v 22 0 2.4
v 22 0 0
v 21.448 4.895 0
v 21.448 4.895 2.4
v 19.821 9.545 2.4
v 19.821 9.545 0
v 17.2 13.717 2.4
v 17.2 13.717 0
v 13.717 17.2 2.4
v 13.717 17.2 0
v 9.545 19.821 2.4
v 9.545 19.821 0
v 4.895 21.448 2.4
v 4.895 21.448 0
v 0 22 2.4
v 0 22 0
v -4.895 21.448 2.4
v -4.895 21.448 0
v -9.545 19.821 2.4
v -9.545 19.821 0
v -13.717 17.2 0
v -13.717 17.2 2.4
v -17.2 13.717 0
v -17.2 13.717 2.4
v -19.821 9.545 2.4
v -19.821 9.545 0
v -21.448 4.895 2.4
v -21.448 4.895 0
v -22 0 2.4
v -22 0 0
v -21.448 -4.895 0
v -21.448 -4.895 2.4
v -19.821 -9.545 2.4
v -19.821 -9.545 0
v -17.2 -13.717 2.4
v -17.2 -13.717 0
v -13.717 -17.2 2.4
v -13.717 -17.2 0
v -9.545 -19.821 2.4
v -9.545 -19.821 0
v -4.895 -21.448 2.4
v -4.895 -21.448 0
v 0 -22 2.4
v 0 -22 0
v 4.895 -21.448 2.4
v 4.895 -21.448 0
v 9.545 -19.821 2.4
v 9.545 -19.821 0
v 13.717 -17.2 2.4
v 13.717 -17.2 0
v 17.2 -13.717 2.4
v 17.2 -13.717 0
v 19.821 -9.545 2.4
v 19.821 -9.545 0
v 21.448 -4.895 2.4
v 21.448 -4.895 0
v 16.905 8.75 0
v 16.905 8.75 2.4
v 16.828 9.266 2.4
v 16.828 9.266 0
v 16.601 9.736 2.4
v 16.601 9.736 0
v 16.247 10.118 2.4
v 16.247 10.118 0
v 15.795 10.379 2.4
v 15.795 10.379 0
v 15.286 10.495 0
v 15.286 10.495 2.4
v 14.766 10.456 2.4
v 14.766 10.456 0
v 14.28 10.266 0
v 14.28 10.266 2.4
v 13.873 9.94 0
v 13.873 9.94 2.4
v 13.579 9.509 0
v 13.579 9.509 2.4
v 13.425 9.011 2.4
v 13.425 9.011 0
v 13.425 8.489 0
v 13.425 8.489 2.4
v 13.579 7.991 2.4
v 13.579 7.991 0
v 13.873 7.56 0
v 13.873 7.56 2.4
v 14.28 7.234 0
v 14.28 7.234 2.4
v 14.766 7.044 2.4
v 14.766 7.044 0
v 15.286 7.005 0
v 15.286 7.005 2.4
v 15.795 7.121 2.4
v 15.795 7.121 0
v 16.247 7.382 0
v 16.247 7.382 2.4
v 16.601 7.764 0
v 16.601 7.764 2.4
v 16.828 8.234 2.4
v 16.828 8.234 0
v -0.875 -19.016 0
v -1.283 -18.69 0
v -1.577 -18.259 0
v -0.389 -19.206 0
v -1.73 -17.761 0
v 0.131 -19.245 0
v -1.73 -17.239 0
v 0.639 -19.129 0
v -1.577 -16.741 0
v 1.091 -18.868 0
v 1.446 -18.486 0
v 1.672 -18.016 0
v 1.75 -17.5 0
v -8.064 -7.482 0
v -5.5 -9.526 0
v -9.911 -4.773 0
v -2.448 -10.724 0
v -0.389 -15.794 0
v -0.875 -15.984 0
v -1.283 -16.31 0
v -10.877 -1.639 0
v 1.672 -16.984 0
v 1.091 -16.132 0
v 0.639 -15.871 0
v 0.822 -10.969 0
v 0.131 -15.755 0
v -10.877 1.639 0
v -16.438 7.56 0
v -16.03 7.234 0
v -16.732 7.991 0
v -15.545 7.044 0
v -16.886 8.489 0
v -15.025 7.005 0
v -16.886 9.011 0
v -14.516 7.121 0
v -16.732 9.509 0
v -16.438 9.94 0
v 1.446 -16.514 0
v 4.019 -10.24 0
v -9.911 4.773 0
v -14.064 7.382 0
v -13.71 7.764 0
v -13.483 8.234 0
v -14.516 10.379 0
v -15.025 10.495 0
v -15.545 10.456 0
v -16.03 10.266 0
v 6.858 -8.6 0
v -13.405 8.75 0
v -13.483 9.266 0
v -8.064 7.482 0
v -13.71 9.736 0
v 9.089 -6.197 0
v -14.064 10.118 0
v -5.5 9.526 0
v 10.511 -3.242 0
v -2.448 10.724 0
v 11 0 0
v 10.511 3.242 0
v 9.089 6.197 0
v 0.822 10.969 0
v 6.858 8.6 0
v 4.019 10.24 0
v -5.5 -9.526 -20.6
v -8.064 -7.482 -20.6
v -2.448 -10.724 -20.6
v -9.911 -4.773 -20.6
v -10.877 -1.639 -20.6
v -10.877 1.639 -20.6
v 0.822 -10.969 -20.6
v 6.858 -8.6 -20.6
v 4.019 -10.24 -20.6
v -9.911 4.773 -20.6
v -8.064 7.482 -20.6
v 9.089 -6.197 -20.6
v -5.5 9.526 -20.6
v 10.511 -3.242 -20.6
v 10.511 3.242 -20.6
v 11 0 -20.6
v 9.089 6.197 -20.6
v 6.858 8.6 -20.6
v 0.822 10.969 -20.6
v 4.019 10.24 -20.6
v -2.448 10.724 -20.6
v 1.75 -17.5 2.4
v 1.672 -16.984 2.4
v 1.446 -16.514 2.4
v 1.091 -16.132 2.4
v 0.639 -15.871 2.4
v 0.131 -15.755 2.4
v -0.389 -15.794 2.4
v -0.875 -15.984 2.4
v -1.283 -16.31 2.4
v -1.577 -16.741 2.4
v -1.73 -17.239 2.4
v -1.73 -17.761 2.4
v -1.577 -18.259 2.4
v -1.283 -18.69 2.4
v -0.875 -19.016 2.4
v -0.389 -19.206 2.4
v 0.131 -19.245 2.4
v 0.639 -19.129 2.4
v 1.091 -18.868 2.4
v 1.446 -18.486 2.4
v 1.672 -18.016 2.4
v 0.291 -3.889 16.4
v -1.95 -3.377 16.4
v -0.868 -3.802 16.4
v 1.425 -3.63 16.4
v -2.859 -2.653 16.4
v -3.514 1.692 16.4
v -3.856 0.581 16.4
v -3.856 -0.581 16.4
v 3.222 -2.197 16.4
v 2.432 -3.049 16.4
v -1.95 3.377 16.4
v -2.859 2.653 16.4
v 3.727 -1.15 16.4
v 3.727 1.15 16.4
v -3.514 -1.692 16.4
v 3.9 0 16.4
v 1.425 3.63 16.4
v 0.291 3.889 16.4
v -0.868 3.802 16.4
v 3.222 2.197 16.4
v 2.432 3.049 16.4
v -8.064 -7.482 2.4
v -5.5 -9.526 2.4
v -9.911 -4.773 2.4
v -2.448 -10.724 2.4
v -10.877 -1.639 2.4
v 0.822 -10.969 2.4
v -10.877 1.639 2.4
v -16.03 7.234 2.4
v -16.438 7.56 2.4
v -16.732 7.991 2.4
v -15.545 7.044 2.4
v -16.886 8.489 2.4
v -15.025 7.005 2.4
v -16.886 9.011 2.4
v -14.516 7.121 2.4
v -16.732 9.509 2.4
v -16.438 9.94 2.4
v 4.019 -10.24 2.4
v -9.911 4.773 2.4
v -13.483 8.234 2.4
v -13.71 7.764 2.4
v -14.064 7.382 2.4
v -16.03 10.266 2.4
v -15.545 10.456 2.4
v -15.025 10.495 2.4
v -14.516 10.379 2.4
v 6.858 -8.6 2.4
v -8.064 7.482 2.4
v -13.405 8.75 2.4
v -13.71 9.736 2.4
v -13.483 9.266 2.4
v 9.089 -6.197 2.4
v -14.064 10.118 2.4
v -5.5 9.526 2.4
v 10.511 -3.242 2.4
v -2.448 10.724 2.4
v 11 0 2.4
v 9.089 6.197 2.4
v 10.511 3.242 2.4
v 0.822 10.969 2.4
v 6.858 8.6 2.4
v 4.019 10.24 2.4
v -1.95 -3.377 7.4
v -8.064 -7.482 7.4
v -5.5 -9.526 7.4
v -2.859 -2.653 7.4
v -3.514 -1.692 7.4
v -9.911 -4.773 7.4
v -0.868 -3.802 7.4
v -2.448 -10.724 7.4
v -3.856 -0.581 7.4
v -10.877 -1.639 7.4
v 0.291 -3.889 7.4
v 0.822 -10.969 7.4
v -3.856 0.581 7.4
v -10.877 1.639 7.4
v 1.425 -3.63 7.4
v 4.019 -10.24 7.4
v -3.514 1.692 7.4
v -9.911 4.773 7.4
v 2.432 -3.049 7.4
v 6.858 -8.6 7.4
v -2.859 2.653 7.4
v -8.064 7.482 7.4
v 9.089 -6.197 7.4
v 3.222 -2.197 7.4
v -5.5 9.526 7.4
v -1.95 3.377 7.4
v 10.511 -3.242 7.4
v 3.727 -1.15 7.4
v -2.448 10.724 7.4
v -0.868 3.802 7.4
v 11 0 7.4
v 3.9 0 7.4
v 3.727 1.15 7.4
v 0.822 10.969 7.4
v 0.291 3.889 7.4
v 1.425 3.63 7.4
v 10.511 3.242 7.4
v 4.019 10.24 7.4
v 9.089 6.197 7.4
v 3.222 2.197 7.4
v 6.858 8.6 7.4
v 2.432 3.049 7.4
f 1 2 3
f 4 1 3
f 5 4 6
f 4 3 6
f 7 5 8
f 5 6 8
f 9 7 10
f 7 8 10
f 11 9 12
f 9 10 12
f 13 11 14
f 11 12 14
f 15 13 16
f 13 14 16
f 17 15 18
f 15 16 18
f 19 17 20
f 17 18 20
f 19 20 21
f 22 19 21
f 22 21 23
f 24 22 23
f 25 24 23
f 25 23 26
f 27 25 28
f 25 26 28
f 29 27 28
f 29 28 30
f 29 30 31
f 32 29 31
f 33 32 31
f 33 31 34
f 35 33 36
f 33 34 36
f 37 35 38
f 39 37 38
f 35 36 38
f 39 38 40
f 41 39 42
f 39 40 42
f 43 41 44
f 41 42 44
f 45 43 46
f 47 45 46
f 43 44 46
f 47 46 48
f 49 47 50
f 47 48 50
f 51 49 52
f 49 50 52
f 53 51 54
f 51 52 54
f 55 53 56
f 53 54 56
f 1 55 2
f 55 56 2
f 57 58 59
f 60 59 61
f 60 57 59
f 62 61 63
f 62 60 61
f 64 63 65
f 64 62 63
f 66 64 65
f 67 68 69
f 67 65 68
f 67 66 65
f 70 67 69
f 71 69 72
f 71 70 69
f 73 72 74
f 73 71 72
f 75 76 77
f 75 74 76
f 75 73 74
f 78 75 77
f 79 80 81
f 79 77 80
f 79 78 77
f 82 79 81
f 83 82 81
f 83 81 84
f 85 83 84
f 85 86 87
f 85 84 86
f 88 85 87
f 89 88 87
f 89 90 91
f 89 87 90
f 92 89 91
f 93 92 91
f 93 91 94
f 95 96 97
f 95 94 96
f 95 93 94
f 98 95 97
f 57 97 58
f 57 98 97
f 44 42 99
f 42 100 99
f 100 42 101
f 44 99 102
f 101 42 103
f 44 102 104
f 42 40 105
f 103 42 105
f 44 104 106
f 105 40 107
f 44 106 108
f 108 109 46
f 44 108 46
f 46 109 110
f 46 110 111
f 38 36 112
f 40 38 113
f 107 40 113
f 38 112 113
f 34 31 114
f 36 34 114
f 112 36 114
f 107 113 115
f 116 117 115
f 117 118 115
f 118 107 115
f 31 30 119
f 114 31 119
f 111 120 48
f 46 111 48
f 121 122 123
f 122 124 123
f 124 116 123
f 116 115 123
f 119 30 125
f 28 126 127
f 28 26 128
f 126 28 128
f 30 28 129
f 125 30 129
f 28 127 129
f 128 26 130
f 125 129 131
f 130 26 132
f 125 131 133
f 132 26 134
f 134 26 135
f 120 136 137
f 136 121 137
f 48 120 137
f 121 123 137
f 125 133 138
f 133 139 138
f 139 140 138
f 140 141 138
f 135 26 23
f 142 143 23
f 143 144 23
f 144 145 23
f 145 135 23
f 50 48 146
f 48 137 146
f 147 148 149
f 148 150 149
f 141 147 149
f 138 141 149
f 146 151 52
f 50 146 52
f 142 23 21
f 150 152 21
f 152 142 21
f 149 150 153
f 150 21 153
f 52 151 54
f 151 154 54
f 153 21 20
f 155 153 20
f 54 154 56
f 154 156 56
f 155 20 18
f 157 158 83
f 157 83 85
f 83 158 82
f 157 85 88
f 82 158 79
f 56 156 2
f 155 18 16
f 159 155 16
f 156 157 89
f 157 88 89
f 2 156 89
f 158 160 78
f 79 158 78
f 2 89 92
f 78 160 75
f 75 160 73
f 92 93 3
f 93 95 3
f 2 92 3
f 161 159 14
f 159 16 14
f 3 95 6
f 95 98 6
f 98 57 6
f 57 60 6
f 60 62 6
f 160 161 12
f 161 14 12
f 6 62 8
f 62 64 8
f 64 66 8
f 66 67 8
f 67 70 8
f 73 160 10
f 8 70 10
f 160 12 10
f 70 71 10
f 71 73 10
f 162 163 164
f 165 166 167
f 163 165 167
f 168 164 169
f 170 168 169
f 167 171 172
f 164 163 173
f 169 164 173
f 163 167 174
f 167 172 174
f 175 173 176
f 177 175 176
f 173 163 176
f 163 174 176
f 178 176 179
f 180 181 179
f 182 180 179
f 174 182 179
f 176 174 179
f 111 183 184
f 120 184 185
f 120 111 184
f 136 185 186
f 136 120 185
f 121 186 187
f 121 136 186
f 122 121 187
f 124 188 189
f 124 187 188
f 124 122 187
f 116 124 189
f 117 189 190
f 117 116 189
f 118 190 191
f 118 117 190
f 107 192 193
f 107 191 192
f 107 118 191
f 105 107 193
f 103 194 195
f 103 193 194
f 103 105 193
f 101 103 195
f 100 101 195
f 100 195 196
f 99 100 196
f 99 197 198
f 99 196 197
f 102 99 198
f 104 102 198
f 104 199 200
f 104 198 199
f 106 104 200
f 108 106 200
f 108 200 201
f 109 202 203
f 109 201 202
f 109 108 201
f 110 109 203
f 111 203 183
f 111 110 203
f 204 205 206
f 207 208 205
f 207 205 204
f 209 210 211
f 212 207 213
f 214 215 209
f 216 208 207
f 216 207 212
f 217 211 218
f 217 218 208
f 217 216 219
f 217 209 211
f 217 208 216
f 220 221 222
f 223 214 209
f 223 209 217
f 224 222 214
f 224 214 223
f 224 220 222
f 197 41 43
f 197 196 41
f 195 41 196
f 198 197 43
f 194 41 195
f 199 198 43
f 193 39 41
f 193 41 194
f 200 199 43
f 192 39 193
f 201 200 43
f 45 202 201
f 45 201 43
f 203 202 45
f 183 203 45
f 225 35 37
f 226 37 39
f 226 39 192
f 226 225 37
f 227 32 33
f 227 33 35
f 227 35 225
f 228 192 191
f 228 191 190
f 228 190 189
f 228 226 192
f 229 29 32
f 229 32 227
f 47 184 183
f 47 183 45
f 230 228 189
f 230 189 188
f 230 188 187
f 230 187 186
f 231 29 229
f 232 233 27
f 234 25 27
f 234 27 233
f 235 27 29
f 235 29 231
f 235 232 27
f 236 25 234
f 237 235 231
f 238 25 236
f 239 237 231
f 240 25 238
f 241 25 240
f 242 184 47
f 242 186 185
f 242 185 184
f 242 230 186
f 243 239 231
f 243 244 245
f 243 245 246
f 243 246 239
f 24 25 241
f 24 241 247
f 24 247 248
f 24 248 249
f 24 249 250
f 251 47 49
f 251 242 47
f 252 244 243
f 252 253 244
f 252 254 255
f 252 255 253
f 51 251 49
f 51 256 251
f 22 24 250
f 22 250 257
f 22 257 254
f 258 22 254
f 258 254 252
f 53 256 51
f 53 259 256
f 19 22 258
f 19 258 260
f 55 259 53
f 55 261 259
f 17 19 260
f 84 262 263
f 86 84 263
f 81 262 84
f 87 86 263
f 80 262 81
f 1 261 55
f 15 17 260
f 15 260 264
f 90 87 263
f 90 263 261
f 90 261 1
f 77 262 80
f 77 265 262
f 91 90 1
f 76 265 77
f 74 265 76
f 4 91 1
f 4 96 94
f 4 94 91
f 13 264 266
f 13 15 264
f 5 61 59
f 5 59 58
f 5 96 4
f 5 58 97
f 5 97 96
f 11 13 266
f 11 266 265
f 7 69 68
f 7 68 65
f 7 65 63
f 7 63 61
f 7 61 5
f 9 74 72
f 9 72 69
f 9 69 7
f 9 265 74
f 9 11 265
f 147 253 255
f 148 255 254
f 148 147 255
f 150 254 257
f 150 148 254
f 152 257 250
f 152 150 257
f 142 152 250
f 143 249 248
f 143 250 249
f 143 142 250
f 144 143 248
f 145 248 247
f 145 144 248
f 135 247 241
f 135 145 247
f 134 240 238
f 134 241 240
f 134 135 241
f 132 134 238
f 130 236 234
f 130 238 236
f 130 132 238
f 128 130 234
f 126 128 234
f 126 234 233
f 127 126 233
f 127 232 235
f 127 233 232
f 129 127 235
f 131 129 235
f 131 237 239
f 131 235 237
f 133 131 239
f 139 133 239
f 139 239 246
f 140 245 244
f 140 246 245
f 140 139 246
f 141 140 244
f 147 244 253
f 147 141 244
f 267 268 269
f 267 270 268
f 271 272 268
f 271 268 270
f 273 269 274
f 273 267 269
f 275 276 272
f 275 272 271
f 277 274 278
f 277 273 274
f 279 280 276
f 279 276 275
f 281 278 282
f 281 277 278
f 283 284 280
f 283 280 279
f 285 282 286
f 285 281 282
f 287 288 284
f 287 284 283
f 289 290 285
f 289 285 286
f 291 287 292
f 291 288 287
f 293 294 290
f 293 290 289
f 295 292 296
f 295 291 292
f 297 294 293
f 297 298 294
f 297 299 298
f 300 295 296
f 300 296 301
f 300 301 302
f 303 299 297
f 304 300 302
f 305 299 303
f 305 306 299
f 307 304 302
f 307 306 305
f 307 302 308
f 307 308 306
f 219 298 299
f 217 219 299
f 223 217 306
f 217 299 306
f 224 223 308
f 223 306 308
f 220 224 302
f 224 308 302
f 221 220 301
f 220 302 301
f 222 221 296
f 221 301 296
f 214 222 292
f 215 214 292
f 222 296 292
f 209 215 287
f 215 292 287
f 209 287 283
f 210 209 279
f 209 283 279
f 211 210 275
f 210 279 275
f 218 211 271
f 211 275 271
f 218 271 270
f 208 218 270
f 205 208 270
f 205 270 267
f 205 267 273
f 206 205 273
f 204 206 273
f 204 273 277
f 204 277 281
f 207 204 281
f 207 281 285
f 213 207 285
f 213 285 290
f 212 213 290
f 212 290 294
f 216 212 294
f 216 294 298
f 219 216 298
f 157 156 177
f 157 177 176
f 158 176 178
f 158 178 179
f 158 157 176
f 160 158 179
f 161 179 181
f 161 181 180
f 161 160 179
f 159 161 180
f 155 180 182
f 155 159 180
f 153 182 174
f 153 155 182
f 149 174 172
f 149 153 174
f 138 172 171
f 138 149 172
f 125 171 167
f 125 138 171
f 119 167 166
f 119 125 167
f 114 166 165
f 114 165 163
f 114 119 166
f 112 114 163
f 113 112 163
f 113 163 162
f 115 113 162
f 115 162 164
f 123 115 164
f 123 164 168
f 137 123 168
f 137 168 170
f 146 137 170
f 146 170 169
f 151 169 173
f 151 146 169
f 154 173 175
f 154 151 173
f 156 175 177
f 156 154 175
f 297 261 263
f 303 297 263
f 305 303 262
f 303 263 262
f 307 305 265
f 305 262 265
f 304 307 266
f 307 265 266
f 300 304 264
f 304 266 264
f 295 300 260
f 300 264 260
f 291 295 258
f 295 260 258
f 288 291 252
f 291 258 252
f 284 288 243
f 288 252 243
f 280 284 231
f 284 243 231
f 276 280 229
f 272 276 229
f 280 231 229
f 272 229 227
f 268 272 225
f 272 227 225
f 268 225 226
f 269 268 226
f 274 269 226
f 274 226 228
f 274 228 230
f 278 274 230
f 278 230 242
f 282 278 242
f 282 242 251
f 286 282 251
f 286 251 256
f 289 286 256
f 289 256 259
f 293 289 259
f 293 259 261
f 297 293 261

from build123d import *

# Parameters (mm, degrees)
ESQUISSE1_R             = 22
BOSS_EXTRU_1_DEPTH      = 2.4
BOSS_EXTRU_2_DEPTH      = 7.4
BOSS_EXTRU_2_DEPTH_BACK = 20.6
ESQUISSE1_3_R           = 11
ESQUISSE1_4_R           = 3.9
BOSS_EXTRU_3_DEPTH      = 16.4
ESQUISSE1_5_R           = 1.75
ENL_V_MAT_EXTRU_1_DEPTH = 38.314340407


with BuildPart() as part:
    # Esquisse1 → Boss.-Extru.1 (new body)
    with BuildSketch(Plane.XY):
        Circle(ESQUISSE1_R)
    extrude(amount=BOSS_EXTRU_1_DEPTH)

    # Esquisse1_3 → Boss.-Extru.2 (add, two sides: drawn at the far end of the back side and taken through both)
    with BuildSketch(Plane.XY.offset(-BOSS_EXTRU_2_DEPTH_BACK)):
        Circle(ESQUISSE1_3_R)
    extrude(amount=BOSS_EXTRU_2_DEPTH + BOSS_EXTRU_2_DEPTH_BACK)

    # Esquisse1_4 → Boss.-Extru.3 (add)
    with BuildSketch(Plane.XY):
        Circle(ESQUISSE1_4_R)
    extrude(amount=BOSS_EXTRU_3_DEPTH)

    # Esquisse1_5 → Enl_v. mat.-Extru.1 (cut, through all)
    with BuildSketch(Plane.XY):
        with Locations((-15.155444566, 8.75)):
            Circle(ESQUISSE1_5_R)
        with Locations((15.155444566, 8.75)):
            Circle(ESQUISSE1_5_R)
        with Locations((0, -17.5)):
            Circle(ESQUISSE1_5_R)
    extrude(amount=ENL_V_MAT_EXTRU_1_DEPTH, mode=Mode.SUBTRACT)


solid = part.part
